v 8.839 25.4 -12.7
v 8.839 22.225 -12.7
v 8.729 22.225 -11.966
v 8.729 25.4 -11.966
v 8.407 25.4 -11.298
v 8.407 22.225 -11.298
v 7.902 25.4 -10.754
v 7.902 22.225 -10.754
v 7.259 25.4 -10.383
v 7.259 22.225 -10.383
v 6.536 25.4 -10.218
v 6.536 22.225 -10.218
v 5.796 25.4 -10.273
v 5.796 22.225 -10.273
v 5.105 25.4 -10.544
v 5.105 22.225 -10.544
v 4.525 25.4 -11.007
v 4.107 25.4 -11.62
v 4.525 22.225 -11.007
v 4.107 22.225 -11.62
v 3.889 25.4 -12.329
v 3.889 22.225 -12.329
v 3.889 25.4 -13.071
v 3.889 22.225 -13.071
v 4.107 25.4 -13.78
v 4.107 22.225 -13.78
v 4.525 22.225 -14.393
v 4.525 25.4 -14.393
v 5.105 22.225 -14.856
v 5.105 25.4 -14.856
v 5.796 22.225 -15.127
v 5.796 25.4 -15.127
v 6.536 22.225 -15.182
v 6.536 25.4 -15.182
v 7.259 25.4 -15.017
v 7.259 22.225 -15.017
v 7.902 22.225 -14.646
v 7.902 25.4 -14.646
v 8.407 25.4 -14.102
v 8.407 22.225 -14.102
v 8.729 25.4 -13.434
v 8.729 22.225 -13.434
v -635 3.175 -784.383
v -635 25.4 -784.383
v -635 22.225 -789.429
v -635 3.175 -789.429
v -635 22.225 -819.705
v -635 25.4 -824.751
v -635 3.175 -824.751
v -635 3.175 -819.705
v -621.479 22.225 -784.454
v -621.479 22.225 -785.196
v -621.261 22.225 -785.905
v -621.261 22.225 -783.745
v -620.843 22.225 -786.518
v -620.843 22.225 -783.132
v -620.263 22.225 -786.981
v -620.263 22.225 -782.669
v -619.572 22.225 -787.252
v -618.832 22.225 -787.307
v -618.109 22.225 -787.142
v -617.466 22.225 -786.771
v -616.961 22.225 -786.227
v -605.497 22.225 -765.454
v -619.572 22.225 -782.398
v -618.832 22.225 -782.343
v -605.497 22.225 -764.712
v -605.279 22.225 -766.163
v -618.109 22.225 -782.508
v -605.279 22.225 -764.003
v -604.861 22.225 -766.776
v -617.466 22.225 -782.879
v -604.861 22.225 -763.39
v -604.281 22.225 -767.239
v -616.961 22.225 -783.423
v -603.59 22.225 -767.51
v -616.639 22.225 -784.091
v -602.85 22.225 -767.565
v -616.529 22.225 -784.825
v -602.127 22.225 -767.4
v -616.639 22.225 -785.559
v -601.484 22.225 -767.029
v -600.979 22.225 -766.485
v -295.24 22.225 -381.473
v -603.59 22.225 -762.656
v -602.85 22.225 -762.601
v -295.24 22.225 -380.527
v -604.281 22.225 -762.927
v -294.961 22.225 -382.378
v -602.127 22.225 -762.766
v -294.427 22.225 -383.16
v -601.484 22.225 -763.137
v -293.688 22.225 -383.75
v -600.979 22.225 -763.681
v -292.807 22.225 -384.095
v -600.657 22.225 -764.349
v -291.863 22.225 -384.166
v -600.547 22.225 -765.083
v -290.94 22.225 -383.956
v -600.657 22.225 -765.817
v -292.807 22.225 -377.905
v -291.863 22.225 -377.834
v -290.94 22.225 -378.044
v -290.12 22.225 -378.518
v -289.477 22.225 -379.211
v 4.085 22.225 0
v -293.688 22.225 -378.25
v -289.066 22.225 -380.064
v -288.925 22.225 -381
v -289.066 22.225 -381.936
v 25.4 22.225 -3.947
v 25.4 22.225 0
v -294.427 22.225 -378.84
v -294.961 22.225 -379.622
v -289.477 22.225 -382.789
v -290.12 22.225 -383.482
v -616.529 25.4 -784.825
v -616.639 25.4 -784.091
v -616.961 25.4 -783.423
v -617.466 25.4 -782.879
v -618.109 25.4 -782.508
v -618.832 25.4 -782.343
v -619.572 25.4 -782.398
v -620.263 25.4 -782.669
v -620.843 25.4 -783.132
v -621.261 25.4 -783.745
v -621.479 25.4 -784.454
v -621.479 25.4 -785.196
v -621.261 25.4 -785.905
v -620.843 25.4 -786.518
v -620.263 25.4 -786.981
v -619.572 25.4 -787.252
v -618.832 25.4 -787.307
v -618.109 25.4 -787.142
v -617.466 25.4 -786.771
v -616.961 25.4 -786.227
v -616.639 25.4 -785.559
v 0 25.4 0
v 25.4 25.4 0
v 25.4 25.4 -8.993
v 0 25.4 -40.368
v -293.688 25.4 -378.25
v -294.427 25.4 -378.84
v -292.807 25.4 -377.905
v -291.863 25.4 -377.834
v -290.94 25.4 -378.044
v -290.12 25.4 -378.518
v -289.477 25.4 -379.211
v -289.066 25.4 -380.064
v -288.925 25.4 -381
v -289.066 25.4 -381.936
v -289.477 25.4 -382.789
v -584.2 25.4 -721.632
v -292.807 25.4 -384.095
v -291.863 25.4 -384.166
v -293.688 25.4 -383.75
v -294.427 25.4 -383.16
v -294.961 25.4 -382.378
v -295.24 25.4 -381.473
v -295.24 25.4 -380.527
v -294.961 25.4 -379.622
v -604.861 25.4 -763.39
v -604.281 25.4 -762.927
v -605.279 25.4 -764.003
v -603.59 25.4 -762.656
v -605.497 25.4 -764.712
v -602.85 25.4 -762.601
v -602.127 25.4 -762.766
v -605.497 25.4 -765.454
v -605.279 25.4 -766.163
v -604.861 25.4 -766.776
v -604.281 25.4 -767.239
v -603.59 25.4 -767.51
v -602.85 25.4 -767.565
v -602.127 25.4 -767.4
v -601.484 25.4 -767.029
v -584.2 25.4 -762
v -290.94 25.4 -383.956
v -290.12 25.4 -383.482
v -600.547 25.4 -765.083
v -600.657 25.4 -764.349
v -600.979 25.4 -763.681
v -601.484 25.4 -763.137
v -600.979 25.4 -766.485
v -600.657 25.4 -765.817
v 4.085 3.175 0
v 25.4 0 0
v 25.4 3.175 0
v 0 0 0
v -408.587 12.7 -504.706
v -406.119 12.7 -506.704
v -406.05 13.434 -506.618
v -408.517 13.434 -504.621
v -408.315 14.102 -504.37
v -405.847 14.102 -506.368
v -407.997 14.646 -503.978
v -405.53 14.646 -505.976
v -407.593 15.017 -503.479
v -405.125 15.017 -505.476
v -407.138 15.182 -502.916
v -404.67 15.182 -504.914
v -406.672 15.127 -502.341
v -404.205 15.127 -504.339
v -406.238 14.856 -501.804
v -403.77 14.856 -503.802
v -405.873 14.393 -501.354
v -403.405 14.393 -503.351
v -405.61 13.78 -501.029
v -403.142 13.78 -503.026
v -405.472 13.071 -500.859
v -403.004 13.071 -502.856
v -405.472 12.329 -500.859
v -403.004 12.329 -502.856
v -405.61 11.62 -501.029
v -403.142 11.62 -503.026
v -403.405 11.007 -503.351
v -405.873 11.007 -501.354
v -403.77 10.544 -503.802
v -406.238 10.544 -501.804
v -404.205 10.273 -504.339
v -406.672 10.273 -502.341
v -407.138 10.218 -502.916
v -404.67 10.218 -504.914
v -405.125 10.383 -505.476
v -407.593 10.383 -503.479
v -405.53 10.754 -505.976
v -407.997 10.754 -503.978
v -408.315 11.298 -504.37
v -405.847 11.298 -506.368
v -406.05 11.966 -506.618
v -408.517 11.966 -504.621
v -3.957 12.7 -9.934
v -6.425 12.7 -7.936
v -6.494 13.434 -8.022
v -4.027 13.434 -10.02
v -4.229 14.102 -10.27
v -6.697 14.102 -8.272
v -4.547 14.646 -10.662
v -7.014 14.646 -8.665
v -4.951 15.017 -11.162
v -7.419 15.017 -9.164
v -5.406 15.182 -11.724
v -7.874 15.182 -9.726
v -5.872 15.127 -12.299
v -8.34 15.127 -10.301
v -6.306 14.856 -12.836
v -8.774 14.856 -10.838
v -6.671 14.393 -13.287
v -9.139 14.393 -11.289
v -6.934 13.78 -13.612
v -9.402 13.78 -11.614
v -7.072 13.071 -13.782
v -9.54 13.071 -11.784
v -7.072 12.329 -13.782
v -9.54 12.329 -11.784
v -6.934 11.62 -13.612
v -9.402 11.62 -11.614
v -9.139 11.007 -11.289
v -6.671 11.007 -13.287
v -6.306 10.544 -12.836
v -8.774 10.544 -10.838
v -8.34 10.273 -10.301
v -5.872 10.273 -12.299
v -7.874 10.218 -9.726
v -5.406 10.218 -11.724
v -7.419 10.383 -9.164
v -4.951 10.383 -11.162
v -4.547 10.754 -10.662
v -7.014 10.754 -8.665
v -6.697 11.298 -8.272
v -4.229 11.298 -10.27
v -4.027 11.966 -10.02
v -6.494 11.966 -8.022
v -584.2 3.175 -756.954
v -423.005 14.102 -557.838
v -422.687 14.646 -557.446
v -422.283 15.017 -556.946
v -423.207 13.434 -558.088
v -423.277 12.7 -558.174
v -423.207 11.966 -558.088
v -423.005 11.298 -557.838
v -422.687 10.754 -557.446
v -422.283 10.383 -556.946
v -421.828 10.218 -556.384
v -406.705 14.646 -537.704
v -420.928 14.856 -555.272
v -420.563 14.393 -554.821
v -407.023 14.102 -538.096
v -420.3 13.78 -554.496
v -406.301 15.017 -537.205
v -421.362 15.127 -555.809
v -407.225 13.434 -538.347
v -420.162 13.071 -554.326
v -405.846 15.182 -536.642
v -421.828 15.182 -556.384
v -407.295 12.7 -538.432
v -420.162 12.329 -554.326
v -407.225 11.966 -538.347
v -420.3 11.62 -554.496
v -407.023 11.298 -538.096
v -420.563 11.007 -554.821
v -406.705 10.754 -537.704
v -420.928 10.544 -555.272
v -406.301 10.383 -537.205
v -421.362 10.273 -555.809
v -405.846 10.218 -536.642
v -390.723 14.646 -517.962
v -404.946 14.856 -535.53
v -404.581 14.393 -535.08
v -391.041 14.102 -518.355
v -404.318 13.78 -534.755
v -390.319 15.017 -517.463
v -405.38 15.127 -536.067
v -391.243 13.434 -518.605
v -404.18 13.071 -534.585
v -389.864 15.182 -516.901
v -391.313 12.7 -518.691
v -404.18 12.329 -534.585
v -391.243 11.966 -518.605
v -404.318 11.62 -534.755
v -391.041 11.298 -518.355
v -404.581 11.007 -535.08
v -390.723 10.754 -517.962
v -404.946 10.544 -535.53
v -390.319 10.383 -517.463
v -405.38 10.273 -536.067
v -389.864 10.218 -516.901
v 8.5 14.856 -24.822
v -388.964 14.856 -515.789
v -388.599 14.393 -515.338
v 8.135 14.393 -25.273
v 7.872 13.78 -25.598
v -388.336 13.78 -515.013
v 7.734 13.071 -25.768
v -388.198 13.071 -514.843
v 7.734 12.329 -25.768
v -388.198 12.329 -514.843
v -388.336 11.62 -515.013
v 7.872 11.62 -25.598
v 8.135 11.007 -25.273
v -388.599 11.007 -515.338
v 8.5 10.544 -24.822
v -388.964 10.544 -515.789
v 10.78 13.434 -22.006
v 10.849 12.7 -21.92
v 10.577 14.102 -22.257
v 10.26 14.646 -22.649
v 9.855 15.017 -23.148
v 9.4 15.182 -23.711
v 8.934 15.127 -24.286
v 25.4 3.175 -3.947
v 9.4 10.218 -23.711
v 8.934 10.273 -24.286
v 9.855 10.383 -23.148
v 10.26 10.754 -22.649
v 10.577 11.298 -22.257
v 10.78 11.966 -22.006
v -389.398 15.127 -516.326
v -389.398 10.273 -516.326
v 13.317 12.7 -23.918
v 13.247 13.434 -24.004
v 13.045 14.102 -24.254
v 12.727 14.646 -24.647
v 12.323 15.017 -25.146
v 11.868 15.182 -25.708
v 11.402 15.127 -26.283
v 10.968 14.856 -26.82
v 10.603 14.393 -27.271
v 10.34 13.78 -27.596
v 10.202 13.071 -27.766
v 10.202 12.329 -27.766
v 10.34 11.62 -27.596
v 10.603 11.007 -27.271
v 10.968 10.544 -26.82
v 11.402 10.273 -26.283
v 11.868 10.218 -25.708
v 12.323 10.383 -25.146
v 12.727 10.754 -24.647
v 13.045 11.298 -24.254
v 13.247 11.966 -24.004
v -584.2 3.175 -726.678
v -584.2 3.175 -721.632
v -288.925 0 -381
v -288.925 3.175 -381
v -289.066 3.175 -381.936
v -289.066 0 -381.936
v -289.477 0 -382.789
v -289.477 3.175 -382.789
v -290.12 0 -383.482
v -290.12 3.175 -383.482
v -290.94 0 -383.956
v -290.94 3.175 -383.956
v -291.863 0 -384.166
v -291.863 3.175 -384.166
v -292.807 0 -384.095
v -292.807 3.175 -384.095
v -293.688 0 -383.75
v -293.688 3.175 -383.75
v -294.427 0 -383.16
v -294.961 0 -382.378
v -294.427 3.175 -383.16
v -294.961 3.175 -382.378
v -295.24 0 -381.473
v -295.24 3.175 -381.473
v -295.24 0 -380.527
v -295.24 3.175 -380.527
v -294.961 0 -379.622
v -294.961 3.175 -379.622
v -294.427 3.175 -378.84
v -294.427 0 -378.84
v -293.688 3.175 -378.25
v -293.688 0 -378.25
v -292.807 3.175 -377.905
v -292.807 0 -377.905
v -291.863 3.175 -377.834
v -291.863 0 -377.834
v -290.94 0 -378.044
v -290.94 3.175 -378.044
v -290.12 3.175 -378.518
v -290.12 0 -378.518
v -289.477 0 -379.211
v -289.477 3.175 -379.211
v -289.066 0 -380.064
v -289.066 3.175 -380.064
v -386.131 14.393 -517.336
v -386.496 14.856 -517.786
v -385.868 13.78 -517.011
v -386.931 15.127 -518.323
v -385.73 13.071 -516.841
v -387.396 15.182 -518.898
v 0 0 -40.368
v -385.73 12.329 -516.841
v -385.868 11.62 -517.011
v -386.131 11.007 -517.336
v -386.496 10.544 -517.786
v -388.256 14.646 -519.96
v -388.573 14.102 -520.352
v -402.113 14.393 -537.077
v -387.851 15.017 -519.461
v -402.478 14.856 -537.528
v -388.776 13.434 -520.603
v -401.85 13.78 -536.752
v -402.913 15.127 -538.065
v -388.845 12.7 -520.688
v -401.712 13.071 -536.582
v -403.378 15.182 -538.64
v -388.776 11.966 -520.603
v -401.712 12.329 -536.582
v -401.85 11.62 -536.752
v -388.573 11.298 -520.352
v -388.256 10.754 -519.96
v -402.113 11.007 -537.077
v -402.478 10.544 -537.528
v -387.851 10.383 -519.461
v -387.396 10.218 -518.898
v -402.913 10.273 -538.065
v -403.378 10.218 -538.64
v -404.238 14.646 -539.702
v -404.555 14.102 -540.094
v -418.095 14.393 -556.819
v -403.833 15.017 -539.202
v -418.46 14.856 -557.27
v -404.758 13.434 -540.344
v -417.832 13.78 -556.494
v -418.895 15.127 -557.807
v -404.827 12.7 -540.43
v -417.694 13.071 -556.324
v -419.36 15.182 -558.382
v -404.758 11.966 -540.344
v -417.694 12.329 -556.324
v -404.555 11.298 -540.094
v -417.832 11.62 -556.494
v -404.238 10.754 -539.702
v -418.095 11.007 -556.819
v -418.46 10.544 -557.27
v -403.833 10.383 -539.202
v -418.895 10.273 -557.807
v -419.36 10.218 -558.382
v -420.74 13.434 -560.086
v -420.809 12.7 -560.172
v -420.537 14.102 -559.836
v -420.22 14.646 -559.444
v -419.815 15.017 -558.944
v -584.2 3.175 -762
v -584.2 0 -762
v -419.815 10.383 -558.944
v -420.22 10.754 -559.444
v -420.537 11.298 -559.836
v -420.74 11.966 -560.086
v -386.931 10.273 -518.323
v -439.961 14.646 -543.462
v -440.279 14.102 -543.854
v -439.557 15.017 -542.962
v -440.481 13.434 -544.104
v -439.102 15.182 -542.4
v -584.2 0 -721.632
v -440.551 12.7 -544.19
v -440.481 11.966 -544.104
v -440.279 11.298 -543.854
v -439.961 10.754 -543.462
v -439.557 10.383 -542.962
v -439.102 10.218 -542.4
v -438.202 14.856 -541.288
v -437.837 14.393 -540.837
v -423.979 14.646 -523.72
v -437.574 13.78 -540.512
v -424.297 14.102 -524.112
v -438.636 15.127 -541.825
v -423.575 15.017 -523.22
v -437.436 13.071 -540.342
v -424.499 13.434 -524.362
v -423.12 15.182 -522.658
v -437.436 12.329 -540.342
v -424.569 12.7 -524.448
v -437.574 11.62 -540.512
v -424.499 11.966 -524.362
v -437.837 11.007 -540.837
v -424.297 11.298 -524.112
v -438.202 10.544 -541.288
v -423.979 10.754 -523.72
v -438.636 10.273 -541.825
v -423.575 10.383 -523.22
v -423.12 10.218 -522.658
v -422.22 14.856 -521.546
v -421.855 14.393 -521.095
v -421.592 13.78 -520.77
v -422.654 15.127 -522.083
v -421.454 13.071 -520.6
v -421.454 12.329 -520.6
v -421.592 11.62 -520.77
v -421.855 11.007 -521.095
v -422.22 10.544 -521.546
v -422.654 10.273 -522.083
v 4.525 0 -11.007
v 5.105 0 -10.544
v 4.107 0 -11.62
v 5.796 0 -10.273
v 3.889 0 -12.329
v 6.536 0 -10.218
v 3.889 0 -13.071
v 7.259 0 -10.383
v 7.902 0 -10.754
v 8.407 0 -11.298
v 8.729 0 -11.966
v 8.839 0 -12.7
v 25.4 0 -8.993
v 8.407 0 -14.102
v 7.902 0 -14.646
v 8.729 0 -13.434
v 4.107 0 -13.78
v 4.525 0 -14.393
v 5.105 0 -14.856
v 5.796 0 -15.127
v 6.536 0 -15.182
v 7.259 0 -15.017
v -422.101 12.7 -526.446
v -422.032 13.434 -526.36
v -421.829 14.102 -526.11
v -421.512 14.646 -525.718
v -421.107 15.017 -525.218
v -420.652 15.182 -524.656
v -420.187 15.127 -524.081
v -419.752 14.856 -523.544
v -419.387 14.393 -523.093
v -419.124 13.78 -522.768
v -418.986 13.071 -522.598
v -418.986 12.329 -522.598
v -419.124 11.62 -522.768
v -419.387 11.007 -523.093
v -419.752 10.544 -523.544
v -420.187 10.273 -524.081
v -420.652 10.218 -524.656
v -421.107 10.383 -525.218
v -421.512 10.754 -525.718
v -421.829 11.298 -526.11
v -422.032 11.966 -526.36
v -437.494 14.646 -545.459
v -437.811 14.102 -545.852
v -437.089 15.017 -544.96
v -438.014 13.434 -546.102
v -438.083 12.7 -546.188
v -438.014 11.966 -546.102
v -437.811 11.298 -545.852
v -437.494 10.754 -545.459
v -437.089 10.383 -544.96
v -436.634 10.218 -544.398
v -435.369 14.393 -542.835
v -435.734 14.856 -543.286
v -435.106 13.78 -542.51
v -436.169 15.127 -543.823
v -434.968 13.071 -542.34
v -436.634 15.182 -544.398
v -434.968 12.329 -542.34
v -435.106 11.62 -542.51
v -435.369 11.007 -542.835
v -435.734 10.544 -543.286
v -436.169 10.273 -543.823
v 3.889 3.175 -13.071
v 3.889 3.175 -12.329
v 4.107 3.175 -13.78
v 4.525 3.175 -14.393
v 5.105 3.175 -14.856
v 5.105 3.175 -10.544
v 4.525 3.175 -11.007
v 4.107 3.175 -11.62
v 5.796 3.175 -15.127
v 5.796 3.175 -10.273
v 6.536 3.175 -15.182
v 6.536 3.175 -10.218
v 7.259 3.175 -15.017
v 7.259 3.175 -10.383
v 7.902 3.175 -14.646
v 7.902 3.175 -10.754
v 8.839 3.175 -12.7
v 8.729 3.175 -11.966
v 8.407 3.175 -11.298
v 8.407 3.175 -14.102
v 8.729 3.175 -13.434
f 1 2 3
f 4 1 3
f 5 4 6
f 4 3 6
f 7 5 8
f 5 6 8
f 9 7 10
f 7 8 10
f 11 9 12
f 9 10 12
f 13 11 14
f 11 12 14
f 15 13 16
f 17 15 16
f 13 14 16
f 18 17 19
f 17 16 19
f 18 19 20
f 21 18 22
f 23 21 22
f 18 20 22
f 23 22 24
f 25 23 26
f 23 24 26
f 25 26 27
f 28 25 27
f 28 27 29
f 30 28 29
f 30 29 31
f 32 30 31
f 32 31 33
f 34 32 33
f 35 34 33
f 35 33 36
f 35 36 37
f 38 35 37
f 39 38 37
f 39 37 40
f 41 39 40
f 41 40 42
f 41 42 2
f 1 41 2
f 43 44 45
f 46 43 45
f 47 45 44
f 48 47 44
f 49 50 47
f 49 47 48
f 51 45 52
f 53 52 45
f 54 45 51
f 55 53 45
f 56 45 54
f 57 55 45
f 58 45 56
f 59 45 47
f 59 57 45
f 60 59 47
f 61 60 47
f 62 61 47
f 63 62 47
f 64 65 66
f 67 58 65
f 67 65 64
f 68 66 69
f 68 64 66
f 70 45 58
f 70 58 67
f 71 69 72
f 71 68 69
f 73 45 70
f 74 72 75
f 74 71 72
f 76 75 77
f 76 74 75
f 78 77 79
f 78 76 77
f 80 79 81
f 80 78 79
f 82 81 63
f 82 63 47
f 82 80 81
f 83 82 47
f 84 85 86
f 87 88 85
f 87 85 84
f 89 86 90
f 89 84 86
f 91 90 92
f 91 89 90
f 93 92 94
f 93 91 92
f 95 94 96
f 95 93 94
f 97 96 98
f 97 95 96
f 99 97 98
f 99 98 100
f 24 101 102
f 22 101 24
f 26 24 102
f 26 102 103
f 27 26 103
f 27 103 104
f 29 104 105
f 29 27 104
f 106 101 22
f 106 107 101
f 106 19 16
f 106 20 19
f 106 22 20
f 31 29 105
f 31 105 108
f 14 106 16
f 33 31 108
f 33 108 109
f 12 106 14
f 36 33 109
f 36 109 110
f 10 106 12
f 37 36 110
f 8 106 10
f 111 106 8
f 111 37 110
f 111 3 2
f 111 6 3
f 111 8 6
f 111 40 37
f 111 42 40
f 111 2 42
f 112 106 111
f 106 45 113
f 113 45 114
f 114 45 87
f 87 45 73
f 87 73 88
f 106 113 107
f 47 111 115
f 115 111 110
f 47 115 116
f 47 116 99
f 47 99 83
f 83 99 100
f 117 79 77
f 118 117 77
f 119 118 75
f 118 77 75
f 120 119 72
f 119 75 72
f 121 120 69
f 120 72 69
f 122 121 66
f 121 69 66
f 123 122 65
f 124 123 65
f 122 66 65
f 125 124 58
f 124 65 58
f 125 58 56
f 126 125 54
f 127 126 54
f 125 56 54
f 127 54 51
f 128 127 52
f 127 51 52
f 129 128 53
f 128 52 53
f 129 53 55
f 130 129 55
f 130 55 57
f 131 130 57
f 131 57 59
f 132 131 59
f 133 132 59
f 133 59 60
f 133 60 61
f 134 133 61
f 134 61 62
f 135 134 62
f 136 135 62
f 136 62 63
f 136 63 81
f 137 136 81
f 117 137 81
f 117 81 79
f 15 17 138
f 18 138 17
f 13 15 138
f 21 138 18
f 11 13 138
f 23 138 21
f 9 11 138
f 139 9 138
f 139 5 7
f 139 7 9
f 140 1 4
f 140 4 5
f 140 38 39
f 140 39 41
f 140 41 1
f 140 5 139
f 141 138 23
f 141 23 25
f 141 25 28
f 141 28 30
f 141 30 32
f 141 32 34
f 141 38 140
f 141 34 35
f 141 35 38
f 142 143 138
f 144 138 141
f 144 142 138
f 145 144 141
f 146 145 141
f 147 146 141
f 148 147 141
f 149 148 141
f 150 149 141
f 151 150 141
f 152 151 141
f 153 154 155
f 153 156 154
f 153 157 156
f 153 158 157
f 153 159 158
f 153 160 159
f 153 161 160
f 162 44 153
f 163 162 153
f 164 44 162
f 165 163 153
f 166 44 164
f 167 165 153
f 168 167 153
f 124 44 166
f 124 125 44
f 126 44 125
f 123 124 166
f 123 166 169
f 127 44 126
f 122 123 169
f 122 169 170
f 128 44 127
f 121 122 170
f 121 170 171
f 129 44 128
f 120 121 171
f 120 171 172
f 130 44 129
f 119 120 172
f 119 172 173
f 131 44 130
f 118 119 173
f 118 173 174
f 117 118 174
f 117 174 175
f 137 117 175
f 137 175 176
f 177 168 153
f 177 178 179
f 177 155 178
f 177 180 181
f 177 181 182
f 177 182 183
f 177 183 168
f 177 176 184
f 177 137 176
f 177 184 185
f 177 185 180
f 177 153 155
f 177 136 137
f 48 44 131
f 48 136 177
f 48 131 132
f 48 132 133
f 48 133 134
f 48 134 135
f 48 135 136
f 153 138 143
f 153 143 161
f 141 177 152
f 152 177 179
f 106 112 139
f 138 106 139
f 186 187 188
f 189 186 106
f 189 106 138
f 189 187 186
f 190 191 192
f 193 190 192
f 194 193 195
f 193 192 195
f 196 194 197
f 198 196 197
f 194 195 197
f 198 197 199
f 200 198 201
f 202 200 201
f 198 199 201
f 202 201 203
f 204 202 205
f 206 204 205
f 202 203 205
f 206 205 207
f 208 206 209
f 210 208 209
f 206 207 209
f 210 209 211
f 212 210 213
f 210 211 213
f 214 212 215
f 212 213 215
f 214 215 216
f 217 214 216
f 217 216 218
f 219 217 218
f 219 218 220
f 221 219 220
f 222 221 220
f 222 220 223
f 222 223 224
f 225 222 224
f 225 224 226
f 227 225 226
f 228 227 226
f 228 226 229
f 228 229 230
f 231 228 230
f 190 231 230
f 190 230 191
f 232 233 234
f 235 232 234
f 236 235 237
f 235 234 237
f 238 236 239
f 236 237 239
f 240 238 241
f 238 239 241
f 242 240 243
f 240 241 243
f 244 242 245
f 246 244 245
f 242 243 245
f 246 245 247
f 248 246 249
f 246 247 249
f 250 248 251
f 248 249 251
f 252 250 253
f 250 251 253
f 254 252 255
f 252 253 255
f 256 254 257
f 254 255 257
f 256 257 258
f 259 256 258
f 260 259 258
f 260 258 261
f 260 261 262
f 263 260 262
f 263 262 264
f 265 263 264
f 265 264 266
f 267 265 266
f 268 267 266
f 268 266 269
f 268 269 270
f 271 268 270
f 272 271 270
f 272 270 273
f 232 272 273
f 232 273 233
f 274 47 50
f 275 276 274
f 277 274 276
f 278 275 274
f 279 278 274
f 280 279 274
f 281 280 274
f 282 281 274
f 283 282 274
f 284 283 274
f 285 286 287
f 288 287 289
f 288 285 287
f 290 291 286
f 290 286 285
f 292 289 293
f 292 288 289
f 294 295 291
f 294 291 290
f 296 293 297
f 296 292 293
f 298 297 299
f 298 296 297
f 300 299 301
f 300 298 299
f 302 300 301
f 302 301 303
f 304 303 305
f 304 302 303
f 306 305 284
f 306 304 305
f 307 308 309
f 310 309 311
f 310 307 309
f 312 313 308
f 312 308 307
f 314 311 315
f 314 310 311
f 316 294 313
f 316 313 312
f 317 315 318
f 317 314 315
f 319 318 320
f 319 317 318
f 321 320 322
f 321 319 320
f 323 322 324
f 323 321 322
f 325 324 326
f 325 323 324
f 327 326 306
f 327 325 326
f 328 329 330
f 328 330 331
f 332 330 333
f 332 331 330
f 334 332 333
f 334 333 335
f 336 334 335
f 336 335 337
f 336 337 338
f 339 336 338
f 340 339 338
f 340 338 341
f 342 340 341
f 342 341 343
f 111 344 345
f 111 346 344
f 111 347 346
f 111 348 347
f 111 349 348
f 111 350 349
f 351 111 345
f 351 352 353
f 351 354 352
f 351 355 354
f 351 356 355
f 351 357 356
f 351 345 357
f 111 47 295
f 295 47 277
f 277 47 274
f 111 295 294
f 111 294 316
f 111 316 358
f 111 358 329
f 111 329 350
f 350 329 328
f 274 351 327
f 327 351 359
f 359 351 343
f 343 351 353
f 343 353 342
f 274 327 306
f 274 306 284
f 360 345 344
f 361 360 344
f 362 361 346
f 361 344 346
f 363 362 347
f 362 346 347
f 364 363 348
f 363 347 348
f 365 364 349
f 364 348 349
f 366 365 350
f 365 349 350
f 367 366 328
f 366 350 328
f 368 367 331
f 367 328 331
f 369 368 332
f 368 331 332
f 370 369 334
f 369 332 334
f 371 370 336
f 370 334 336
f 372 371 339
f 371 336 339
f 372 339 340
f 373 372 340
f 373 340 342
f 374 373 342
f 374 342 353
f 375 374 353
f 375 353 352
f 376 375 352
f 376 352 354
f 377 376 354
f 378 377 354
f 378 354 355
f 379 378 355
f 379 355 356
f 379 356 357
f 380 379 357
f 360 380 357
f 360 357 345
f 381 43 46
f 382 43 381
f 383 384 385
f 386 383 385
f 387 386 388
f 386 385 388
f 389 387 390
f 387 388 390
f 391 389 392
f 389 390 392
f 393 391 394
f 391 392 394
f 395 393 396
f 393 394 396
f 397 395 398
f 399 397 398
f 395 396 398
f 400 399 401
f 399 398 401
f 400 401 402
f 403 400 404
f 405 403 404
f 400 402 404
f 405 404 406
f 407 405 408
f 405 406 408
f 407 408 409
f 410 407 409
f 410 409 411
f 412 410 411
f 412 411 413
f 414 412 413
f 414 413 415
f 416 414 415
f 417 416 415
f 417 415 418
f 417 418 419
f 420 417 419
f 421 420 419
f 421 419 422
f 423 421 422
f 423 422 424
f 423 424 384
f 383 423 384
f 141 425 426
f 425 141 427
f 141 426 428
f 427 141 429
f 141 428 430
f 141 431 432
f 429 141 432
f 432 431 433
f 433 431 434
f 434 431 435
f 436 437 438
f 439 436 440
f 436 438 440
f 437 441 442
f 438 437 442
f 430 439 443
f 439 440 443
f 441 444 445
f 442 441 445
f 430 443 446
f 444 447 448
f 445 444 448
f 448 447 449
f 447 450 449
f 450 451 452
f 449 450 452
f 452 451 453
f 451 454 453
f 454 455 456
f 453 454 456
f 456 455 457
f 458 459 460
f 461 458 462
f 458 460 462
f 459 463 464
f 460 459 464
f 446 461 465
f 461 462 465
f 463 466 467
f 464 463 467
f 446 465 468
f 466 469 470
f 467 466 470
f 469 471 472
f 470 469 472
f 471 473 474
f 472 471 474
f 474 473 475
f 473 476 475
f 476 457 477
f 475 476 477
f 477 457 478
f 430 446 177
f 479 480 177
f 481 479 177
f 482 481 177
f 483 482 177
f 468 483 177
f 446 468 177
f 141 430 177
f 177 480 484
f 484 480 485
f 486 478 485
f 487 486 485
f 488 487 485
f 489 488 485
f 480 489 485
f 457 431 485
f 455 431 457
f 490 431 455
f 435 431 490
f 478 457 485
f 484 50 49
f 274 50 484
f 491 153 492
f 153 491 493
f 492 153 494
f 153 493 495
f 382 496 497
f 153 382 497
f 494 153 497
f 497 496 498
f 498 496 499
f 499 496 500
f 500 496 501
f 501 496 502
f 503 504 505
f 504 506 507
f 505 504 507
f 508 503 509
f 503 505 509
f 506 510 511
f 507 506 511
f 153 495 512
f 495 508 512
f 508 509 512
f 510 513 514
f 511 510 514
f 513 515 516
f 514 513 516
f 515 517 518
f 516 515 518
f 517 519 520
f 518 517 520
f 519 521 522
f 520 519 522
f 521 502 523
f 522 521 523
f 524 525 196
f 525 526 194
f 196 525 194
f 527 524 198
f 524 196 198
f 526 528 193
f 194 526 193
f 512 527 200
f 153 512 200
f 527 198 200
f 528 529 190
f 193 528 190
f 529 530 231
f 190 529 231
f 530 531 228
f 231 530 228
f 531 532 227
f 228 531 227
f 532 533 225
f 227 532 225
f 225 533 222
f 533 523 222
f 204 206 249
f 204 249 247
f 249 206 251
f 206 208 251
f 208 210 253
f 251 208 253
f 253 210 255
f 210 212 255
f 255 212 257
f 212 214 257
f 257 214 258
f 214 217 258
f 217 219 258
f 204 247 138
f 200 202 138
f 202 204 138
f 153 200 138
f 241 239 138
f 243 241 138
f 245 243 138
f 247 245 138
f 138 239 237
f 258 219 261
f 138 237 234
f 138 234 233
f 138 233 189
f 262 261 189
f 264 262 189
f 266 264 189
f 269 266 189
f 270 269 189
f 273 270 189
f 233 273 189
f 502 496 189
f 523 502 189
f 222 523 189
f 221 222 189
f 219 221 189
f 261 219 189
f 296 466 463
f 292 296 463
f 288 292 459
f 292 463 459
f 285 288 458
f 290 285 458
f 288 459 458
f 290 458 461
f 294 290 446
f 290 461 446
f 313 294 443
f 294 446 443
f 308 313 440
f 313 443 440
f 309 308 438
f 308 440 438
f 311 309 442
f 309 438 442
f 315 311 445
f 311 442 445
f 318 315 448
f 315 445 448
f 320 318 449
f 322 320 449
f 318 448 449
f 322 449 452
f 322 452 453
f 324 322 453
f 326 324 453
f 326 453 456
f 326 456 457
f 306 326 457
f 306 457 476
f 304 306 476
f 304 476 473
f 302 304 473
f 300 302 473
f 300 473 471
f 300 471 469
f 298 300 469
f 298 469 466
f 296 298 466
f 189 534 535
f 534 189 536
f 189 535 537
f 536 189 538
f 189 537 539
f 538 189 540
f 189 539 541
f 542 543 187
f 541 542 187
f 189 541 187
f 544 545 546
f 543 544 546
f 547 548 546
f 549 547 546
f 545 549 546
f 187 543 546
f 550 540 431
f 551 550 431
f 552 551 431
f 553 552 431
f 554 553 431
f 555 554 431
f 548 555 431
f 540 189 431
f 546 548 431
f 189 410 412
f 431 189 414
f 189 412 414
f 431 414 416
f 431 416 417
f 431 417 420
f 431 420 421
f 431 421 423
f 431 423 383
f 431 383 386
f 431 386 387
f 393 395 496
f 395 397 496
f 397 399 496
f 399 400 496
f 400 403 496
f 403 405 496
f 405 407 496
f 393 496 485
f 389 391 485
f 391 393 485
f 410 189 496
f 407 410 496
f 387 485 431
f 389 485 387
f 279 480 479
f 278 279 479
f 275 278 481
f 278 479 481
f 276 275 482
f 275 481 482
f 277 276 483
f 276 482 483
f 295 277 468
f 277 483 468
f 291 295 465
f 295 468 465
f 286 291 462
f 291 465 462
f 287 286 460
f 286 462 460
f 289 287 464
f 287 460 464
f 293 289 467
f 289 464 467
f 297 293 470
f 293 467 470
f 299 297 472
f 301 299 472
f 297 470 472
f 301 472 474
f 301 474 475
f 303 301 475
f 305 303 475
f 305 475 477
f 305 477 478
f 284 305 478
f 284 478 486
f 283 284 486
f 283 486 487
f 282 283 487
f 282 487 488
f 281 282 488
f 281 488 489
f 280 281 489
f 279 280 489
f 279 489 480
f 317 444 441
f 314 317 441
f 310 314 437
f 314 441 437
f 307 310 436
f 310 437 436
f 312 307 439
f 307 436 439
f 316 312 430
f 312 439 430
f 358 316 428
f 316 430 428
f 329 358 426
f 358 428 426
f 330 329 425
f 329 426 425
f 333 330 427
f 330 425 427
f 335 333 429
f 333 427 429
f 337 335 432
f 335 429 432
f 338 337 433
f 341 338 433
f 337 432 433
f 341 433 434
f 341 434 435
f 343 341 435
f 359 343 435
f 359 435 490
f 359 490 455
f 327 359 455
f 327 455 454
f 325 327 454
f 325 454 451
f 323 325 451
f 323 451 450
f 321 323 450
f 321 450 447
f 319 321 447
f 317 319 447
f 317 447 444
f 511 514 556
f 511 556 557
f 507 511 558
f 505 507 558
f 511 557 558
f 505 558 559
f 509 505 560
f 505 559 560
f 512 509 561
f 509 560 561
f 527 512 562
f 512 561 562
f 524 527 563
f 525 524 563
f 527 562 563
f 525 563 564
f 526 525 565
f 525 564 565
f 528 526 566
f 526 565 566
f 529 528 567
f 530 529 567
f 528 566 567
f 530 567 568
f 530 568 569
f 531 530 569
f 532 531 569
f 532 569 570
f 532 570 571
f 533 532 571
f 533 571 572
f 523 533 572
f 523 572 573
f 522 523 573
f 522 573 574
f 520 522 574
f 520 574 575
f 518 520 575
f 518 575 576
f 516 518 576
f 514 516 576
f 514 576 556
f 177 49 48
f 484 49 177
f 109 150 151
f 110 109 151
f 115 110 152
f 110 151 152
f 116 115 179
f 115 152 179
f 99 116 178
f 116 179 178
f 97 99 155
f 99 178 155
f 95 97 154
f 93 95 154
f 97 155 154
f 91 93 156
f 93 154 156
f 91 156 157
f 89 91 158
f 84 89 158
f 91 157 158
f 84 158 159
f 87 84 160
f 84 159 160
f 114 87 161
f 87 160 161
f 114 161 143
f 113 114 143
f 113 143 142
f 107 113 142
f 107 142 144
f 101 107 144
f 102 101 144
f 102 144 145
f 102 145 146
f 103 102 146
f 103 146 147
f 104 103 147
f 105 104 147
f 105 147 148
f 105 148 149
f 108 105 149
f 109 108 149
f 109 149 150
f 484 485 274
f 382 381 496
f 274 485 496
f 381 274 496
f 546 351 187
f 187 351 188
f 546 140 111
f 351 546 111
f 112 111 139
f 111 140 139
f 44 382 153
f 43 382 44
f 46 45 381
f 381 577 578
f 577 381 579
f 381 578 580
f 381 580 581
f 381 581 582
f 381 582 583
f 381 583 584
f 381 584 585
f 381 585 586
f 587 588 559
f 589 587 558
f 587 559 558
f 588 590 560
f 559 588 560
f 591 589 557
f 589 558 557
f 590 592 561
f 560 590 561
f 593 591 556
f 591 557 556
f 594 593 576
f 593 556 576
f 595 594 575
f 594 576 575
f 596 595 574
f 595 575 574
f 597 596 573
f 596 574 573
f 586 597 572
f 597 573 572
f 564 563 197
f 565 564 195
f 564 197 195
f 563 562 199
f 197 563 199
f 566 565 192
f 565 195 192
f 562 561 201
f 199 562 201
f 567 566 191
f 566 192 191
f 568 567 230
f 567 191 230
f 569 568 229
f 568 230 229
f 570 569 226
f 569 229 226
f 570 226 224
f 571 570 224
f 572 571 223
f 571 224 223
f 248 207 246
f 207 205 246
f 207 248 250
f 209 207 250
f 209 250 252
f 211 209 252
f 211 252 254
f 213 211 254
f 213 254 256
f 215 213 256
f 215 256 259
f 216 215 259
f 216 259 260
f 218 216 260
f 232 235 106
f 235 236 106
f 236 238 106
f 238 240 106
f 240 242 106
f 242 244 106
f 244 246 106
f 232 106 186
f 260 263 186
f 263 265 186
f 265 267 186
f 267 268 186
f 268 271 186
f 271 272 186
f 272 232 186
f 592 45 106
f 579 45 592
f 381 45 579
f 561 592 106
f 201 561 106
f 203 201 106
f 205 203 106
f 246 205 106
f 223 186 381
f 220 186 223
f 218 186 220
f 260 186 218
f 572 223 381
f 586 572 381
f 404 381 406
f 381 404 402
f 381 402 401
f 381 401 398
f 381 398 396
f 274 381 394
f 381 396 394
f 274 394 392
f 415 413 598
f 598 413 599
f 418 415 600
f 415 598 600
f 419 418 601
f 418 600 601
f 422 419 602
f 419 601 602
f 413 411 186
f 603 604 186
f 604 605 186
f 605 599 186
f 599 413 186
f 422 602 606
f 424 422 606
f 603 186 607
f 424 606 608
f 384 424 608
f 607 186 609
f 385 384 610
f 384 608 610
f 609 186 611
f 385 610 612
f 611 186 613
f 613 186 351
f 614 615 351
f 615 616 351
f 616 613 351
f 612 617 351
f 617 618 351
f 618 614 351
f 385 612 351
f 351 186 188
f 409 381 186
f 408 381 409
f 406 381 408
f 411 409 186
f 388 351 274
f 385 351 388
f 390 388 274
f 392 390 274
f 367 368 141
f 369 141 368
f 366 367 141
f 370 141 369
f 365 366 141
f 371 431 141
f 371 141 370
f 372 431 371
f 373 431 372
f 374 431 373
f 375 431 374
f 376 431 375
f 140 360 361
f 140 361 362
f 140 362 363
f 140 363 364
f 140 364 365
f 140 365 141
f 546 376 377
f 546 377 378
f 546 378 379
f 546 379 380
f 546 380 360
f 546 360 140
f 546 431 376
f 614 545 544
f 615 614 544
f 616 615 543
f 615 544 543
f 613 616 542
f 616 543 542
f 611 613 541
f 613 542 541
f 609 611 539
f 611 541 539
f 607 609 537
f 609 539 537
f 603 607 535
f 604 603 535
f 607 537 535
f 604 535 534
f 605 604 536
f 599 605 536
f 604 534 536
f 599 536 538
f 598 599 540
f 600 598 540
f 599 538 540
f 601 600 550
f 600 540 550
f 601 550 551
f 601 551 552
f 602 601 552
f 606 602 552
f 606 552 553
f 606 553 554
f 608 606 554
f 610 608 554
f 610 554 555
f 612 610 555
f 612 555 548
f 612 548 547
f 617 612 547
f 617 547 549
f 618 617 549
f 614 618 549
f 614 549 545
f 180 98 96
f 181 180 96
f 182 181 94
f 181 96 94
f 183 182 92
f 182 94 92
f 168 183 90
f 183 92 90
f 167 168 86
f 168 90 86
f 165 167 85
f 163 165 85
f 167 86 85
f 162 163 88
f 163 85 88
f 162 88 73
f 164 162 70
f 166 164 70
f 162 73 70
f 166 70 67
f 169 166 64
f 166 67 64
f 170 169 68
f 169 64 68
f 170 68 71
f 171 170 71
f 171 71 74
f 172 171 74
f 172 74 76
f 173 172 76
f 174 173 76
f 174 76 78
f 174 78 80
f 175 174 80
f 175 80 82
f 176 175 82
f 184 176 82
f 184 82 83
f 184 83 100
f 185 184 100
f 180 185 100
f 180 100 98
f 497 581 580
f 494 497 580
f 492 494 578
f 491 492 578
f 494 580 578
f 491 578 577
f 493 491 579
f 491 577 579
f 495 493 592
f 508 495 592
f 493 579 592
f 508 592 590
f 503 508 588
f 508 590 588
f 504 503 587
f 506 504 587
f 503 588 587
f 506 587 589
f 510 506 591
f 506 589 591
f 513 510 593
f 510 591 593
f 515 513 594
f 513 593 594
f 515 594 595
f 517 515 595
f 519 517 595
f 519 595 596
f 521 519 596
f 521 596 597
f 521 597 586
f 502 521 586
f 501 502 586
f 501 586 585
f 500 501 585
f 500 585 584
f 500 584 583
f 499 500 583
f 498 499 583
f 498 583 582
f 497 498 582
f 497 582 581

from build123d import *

# Parameters (mm, degrees)
BOSS_EXTRUDE1_DEPTH      = 25.4
SKETCH2_W                = 19.05
SKETCH2_H                = 19.05
CUT_EXTRUDE1_DEPTH       = 1062.13626679
CUT_EXTRUDE4_DEPTH       = 26.4
SKETCH4_R                = 2.5019
SKETCH4_R_2              = 2.4892
CUT_EXTRUDE5_DEPTH       = 26.4
SKETCH6_R                = 2.4892
CUT_EXTRUDE7_DEPTH       = 539.684978519
SKETCH7_R                = 3.175
CUT_EXTRUDE8_DEPTH       = 26.4
CUT_EXTRUDE14_DEPTH      = 3.175
SKETCH16_R               = 2.4892
CUT_EXTRUDE15_DEPTH      = 23.225
CUT_EXTRUDE15_DEPTH_BACK = 4.175
SKETCH17_R               = 2.4892
CUT_EXTRUDE16_DEPTH      = 519.943248576


with BuildPart() as part:
    # Sketch1 → Boss-Extrude1 (new body)
    with BuildSketch(Plane(origin=(0, 0, 0), x_dir=(1, 0, 0), z_dir=(0, 1, 0))):
        Polygon((-584.2, 762), (-584.2, 721.632068306), (0, 0), (0, 40.367931694), align=None)
        Polygon((0, 40.367931694), (32.680013447, 0), (0, 0), align=None)
        Polygon((-635, 824.750614635), (-584.2, 762), (-584.2, 721.632068306), (-635, 784.382682941), align=None)
    extrude(amount=BOSS_EXTRUDE1_DEPTH)

    # Sketch2 → Cut-Extrude1 (cut, through all)
    with BuildSketch(Plane(origin=(12.938283504, 0, 15.981992956), x_dir=(0, -1, 0), z_dir=(0.629212321, 0, 0.777233462))):
        with Locations((-12.7, 12.7)):
            Rectangle(SKETCH2_W, SKETCH2_H)
    extrude(amount=-CUT_EXTRUDE1_DEPTH, mode=Mode.SUBTRACT)

    # Sketch3 → Cut-Extrude4 (cut, through all)
    with BuildSketch(Plane(origin=(0, 25.4, 0), x_dir=(1, 0, 0), z_dir=(0, 1, 0))):
        Polygon((25.4, 8.992624377), (25.4, 0), (32.680013447, 0), align=None)
    extrude(amount=-CUT_EXTRUDE4_DEPTH, mode=Mode.SUBTRACT)

    # Sketch4 → Cut-Extrude5 (cut, through all)
    with BuildSketch(Plane.XZ):
        with Locations((-571.537427097, -1019.306313169)):
            Circle(SKETCH4_R)
        with Locations((-565.206140645, -1008.297007475)):
            Circle(SKETCH4_R)
        with Locations((6.35, -12.7)):
            Circle(SKETCH4_R_2)
    extrude(amount=-CUT_EXTRUDE5_DEPTH, mode=Mode.SUBTRACT)

    # Sketch6 → Cut-Extrude7 (cut, through all)
    with BuildSketch(Plane(origin=(0, 0, 0), x_dir=(0.629212321, 0, 0.777233462), z_dir=(-0.777233462, 0, 0.629212321))):
        with Locations((-12.7, 12.7)):
            Circle(SKETCH6_R)
    extrude(amount=-CUT_EXTRUDE7_DEPTH, mode=Mode.SUBTRACT)

    # Sketch7 → Cut-Extrude8 (cut, through all)
    with BuildSketch(Plane(origin=(0, 25.4, 0), x_dir=(1, 0, 0), z_dir=(0, 1, 0))):
        with Locations((-292.1, 381)):
            Circle(SKETCH7_R)
    extrude(amount=-CUT_EXTRUDE8_DEPTH, mode=Mode.SUBTRACT)

    # Sketch15 → Cut-Extrude14 (cut)
    with BuildSketch(Plane.XZ):
        Polygon((-635, -784.382682941), (-635, -824.750614635), (-584.2, -762), (-584.2, -721.632068306), align=None)
    extrude(amount=-CUT_EXTRUDE14_DEPTH, mode=Mode.SUBTRACT)

    # Sketch16 → Cut-Extrude15 (cut, two sides)
    with BuildSketch(Plane.XZ.offset(-22.225)) as cut_extrude15_sk:
        with Locations((-603.036014087, -765.083188902)):
            Circle(SKETCH16_R)
        with Locations((-619.018007044, -784.824918845)):
            Circle(SKETCH16_R)
    extrude(amount=CUT_EXTRUDE15_DEPTH, mode=Mode.SUBTRACT)
    extrude(cut_extrude15_sk.sketch, amount=-CUT_EXTRUDE15_DEPTH_BACK, mode=Mode.SUBTRACT)

    # Sketch17 → Cut-Extrude16 (cut, through all)
    with BuildSketch(Plane(origin=(19.741729943, 0, -15.981992956), x_dir=(-0.629212321, 0, -0.777233462), z_dir=(0.777233462, 0, -0.629212321))):
        with Locations((697.673599675, 12.7)):
            Circle(SKETCH17_R)
        with Locations((672.273599675, 12.7)):
            Circle(SKETCH17_R)
        with Locations((646.873599675, 12.7)):
            Circle(SKETCH17_R)
    extrude(amount=-CUT_EXTRUDE16_DEPTH, mode=Mode.SUBTRACT)


solid = part.part
